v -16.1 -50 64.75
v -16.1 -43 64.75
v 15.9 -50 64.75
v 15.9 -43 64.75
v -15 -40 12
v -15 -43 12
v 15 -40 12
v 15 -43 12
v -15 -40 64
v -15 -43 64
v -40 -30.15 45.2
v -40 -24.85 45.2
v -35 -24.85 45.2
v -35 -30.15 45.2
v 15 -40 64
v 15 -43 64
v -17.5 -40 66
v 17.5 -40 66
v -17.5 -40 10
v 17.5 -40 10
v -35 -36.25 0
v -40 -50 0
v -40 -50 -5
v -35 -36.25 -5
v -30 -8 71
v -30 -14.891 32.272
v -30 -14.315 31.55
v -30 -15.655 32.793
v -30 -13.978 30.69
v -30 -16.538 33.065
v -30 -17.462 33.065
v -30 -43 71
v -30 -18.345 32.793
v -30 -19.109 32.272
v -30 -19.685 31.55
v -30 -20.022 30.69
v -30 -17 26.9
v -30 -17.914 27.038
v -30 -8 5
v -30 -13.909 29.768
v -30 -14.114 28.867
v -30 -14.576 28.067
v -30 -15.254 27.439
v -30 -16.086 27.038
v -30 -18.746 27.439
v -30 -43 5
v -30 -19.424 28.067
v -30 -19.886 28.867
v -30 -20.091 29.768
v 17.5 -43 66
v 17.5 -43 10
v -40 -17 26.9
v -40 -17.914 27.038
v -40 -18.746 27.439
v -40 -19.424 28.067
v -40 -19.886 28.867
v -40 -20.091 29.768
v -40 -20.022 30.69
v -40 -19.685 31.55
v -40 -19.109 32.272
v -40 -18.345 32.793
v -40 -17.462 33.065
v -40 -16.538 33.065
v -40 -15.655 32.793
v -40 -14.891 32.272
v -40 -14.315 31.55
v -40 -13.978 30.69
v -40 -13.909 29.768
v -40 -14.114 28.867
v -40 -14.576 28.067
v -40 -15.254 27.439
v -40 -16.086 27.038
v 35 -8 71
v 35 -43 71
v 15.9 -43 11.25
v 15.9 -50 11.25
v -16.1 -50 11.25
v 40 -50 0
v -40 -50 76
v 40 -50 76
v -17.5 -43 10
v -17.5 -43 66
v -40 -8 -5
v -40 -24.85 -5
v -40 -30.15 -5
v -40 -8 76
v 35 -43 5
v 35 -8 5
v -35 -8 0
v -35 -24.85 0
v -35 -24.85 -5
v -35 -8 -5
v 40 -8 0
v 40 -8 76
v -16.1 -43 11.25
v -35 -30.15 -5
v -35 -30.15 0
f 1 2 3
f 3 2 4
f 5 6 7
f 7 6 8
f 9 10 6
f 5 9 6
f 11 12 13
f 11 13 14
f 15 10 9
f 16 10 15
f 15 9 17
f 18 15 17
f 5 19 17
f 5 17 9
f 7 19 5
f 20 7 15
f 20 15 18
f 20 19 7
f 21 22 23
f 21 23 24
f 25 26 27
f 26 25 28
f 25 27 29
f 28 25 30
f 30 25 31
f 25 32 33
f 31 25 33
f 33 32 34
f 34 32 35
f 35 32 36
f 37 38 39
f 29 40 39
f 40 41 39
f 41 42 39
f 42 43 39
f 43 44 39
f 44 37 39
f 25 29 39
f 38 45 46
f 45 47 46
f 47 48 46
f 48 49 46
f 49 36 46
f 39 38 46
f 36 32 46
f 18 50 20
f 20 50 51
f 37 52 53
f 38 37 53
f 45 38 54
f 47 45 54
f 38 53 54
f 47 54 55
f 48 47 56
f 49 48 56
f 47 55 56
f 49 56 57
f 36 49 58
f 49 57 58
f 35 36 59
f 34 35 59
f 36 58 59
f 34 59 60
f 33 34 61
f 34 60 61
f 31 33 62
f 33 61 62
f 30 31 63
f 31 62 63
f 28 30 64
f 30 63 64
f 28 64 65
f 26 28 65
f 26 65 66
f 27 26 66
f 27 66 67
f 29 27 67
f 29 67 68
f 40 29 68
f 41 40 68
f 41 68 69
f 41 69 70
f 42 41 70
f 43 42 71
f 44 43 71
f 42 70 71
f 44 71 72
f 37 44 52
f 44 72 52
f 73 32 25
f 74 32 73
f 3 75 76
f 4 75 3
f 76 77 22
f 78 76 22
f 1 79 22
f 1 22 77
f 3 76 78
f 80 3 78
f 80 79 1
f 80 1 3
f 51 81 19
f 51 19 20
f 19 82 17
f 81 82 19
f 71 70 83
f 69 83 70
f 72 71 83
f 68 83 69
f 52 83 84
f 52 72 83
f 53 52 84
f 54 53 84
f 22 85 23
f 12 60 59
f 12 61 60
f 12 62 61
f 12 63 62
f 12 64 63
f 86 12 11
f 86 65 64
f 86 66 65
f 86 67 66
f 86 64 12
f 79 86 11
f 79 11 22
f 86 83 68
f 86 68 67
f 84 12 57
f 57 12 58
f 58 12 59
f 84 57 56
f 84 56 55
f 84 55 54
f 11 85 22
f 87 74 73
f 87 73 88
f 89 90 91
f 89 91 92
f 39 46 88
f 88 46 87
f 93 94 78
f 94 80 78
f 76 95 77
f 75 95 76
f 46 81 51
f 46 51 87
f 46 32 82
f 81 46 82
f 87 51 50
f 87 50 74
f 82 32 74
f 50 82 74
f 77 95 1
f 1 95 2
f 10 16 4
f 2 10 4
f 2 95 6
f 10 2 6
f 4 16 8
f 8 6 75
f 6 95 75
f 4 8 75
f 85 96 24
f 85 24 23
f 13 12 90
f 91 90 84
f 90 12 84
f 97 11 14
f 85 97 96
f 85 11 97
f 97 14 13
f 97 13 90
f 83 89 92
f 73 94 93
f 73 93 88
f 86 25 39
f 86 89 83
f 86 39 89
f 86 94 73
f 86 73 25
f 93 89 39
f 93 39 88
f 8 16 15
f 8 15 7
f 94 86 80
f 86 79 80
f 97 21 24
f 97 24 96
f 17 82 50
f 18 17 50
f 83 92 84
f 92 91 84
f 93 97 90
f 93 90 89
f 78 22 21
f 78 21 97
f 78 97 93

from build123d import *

# Parameters (mm, degrees)
SKETCH_W        = 80
SKETCH_H        = 76
SKETCH_W_2      = 32
SKETCH_H_2      = 53.5
PAD_DEPTH       = 7
SKETCH001_W     = 80
SKETCH001_H     = 76
SKETCH001_W_2   = 65
SKETCH001_H_2   = 66
PAD001_DEPTH    = 35
PAD005_DEPTH    = 5
SKETCH008_W     = 50.2
SKETCH008_H     = 5.3
POCKET_DEPTH    = 5
SKETCH012_R     = 3.1
POCKET003_DEPTH = 10
SKETCH013_W     = 35
SKETCH013_H     = 56
SKETCH013_W_2   = 30
SKETCH013_H_2   = 52
PAD008_DEPTH    = 3


with BuildPart() as part:
    # Sketch → Pad (new body)
    with BuildSketch(Plane.XZ):
        with Locations((0, 38)):
            Rectangle(SKETCH_W, SKETCH_H)
        with Locations((-0.1, 38)):
            Rectangle(SKETCH_W_2, SKETCH_H_2, mode=Mode.SUBTRACT)
    extrude(amount=PAD_DEPTH)

    # Sketch001 (on Face9 of Pad) → Pad001 (join)
    with BuildSketch(Plane(origin=(0, 0, 0), x_dir=(1, 0, 0), z_dir=(0, 1, 0))):
        with Locations((0, -38)):
            Rectangle(SKETCH001_W, SKETCH001_H)
        with Locations((2.5, -38)):
            Rectangle(SKETCH001_W_2, SKETCH001_H_2, mode=Mode.SUBTRACT)
    extrude(amount=PAD001_DEPTH)

    # Sketch005 (on Face12 of Pad001) → Pad005 (join)
    with BuildSketch(Plane(origin=(0, 0, 0), x_dir=(1, 0, 0), z_dir=(0, 0, -1))):
        Polygon((-40, -35), (-40, 7), (-35, -6.75), (-35, -35), align=None)
    extrude(amount=PAD005_DEPTH)

    # Sketch008 (on Face18 of Pad005) → Pocket (cut)
    with BuildSketch(Plane(origin=(-40, 0, 0), x_dir=(0, 0, -1), z_dir=(-1, 0, 0))):
        with Locations((-20.1, -15.5)):
            Rectangle(SKETCH008_W, SKETCH008_H)
    extrude(amount=-POCKET_DEPTH, mode=Mode.SUBTRACT)

    # Sketch012 (on Face16 of Pocket) → Pocket003 (cut)
    with BuildSketch(Plane(origin=(-40, 0, 0), x_dir=(0, 0, -1), z_dir=(-1, 0, 0))):
        with Locations((-30, -26)):
            Circle(SKETCH012_R)
    extrude(amount=-POCKET003_DEPTH, mode=Mode.SUBTRACT)

    # Sketch013 (on Face3 of Pocket003) → Pad008 (join)
    with BuildSketch(Plane(origin=(0, 0, 0), x_dir=(1, 0, 0), z_dir=(0, 1, 0))):
        with Locations((0, -38)):
            Rectangle(SKETCH013_W, SKETCH013_H)
        with Locations((0, -38)):
            Rectangle(SKETCH013_W_2, SKETCH013_H_2, mode=Mode.SUBTRACT)
    extrude(amount=PAD008_DEPTH)


with BuildPart() as part_1:
    # Body placement: moved
    add(part.part.moved(Location((0, -43, 0))))


solid = part_1.part
